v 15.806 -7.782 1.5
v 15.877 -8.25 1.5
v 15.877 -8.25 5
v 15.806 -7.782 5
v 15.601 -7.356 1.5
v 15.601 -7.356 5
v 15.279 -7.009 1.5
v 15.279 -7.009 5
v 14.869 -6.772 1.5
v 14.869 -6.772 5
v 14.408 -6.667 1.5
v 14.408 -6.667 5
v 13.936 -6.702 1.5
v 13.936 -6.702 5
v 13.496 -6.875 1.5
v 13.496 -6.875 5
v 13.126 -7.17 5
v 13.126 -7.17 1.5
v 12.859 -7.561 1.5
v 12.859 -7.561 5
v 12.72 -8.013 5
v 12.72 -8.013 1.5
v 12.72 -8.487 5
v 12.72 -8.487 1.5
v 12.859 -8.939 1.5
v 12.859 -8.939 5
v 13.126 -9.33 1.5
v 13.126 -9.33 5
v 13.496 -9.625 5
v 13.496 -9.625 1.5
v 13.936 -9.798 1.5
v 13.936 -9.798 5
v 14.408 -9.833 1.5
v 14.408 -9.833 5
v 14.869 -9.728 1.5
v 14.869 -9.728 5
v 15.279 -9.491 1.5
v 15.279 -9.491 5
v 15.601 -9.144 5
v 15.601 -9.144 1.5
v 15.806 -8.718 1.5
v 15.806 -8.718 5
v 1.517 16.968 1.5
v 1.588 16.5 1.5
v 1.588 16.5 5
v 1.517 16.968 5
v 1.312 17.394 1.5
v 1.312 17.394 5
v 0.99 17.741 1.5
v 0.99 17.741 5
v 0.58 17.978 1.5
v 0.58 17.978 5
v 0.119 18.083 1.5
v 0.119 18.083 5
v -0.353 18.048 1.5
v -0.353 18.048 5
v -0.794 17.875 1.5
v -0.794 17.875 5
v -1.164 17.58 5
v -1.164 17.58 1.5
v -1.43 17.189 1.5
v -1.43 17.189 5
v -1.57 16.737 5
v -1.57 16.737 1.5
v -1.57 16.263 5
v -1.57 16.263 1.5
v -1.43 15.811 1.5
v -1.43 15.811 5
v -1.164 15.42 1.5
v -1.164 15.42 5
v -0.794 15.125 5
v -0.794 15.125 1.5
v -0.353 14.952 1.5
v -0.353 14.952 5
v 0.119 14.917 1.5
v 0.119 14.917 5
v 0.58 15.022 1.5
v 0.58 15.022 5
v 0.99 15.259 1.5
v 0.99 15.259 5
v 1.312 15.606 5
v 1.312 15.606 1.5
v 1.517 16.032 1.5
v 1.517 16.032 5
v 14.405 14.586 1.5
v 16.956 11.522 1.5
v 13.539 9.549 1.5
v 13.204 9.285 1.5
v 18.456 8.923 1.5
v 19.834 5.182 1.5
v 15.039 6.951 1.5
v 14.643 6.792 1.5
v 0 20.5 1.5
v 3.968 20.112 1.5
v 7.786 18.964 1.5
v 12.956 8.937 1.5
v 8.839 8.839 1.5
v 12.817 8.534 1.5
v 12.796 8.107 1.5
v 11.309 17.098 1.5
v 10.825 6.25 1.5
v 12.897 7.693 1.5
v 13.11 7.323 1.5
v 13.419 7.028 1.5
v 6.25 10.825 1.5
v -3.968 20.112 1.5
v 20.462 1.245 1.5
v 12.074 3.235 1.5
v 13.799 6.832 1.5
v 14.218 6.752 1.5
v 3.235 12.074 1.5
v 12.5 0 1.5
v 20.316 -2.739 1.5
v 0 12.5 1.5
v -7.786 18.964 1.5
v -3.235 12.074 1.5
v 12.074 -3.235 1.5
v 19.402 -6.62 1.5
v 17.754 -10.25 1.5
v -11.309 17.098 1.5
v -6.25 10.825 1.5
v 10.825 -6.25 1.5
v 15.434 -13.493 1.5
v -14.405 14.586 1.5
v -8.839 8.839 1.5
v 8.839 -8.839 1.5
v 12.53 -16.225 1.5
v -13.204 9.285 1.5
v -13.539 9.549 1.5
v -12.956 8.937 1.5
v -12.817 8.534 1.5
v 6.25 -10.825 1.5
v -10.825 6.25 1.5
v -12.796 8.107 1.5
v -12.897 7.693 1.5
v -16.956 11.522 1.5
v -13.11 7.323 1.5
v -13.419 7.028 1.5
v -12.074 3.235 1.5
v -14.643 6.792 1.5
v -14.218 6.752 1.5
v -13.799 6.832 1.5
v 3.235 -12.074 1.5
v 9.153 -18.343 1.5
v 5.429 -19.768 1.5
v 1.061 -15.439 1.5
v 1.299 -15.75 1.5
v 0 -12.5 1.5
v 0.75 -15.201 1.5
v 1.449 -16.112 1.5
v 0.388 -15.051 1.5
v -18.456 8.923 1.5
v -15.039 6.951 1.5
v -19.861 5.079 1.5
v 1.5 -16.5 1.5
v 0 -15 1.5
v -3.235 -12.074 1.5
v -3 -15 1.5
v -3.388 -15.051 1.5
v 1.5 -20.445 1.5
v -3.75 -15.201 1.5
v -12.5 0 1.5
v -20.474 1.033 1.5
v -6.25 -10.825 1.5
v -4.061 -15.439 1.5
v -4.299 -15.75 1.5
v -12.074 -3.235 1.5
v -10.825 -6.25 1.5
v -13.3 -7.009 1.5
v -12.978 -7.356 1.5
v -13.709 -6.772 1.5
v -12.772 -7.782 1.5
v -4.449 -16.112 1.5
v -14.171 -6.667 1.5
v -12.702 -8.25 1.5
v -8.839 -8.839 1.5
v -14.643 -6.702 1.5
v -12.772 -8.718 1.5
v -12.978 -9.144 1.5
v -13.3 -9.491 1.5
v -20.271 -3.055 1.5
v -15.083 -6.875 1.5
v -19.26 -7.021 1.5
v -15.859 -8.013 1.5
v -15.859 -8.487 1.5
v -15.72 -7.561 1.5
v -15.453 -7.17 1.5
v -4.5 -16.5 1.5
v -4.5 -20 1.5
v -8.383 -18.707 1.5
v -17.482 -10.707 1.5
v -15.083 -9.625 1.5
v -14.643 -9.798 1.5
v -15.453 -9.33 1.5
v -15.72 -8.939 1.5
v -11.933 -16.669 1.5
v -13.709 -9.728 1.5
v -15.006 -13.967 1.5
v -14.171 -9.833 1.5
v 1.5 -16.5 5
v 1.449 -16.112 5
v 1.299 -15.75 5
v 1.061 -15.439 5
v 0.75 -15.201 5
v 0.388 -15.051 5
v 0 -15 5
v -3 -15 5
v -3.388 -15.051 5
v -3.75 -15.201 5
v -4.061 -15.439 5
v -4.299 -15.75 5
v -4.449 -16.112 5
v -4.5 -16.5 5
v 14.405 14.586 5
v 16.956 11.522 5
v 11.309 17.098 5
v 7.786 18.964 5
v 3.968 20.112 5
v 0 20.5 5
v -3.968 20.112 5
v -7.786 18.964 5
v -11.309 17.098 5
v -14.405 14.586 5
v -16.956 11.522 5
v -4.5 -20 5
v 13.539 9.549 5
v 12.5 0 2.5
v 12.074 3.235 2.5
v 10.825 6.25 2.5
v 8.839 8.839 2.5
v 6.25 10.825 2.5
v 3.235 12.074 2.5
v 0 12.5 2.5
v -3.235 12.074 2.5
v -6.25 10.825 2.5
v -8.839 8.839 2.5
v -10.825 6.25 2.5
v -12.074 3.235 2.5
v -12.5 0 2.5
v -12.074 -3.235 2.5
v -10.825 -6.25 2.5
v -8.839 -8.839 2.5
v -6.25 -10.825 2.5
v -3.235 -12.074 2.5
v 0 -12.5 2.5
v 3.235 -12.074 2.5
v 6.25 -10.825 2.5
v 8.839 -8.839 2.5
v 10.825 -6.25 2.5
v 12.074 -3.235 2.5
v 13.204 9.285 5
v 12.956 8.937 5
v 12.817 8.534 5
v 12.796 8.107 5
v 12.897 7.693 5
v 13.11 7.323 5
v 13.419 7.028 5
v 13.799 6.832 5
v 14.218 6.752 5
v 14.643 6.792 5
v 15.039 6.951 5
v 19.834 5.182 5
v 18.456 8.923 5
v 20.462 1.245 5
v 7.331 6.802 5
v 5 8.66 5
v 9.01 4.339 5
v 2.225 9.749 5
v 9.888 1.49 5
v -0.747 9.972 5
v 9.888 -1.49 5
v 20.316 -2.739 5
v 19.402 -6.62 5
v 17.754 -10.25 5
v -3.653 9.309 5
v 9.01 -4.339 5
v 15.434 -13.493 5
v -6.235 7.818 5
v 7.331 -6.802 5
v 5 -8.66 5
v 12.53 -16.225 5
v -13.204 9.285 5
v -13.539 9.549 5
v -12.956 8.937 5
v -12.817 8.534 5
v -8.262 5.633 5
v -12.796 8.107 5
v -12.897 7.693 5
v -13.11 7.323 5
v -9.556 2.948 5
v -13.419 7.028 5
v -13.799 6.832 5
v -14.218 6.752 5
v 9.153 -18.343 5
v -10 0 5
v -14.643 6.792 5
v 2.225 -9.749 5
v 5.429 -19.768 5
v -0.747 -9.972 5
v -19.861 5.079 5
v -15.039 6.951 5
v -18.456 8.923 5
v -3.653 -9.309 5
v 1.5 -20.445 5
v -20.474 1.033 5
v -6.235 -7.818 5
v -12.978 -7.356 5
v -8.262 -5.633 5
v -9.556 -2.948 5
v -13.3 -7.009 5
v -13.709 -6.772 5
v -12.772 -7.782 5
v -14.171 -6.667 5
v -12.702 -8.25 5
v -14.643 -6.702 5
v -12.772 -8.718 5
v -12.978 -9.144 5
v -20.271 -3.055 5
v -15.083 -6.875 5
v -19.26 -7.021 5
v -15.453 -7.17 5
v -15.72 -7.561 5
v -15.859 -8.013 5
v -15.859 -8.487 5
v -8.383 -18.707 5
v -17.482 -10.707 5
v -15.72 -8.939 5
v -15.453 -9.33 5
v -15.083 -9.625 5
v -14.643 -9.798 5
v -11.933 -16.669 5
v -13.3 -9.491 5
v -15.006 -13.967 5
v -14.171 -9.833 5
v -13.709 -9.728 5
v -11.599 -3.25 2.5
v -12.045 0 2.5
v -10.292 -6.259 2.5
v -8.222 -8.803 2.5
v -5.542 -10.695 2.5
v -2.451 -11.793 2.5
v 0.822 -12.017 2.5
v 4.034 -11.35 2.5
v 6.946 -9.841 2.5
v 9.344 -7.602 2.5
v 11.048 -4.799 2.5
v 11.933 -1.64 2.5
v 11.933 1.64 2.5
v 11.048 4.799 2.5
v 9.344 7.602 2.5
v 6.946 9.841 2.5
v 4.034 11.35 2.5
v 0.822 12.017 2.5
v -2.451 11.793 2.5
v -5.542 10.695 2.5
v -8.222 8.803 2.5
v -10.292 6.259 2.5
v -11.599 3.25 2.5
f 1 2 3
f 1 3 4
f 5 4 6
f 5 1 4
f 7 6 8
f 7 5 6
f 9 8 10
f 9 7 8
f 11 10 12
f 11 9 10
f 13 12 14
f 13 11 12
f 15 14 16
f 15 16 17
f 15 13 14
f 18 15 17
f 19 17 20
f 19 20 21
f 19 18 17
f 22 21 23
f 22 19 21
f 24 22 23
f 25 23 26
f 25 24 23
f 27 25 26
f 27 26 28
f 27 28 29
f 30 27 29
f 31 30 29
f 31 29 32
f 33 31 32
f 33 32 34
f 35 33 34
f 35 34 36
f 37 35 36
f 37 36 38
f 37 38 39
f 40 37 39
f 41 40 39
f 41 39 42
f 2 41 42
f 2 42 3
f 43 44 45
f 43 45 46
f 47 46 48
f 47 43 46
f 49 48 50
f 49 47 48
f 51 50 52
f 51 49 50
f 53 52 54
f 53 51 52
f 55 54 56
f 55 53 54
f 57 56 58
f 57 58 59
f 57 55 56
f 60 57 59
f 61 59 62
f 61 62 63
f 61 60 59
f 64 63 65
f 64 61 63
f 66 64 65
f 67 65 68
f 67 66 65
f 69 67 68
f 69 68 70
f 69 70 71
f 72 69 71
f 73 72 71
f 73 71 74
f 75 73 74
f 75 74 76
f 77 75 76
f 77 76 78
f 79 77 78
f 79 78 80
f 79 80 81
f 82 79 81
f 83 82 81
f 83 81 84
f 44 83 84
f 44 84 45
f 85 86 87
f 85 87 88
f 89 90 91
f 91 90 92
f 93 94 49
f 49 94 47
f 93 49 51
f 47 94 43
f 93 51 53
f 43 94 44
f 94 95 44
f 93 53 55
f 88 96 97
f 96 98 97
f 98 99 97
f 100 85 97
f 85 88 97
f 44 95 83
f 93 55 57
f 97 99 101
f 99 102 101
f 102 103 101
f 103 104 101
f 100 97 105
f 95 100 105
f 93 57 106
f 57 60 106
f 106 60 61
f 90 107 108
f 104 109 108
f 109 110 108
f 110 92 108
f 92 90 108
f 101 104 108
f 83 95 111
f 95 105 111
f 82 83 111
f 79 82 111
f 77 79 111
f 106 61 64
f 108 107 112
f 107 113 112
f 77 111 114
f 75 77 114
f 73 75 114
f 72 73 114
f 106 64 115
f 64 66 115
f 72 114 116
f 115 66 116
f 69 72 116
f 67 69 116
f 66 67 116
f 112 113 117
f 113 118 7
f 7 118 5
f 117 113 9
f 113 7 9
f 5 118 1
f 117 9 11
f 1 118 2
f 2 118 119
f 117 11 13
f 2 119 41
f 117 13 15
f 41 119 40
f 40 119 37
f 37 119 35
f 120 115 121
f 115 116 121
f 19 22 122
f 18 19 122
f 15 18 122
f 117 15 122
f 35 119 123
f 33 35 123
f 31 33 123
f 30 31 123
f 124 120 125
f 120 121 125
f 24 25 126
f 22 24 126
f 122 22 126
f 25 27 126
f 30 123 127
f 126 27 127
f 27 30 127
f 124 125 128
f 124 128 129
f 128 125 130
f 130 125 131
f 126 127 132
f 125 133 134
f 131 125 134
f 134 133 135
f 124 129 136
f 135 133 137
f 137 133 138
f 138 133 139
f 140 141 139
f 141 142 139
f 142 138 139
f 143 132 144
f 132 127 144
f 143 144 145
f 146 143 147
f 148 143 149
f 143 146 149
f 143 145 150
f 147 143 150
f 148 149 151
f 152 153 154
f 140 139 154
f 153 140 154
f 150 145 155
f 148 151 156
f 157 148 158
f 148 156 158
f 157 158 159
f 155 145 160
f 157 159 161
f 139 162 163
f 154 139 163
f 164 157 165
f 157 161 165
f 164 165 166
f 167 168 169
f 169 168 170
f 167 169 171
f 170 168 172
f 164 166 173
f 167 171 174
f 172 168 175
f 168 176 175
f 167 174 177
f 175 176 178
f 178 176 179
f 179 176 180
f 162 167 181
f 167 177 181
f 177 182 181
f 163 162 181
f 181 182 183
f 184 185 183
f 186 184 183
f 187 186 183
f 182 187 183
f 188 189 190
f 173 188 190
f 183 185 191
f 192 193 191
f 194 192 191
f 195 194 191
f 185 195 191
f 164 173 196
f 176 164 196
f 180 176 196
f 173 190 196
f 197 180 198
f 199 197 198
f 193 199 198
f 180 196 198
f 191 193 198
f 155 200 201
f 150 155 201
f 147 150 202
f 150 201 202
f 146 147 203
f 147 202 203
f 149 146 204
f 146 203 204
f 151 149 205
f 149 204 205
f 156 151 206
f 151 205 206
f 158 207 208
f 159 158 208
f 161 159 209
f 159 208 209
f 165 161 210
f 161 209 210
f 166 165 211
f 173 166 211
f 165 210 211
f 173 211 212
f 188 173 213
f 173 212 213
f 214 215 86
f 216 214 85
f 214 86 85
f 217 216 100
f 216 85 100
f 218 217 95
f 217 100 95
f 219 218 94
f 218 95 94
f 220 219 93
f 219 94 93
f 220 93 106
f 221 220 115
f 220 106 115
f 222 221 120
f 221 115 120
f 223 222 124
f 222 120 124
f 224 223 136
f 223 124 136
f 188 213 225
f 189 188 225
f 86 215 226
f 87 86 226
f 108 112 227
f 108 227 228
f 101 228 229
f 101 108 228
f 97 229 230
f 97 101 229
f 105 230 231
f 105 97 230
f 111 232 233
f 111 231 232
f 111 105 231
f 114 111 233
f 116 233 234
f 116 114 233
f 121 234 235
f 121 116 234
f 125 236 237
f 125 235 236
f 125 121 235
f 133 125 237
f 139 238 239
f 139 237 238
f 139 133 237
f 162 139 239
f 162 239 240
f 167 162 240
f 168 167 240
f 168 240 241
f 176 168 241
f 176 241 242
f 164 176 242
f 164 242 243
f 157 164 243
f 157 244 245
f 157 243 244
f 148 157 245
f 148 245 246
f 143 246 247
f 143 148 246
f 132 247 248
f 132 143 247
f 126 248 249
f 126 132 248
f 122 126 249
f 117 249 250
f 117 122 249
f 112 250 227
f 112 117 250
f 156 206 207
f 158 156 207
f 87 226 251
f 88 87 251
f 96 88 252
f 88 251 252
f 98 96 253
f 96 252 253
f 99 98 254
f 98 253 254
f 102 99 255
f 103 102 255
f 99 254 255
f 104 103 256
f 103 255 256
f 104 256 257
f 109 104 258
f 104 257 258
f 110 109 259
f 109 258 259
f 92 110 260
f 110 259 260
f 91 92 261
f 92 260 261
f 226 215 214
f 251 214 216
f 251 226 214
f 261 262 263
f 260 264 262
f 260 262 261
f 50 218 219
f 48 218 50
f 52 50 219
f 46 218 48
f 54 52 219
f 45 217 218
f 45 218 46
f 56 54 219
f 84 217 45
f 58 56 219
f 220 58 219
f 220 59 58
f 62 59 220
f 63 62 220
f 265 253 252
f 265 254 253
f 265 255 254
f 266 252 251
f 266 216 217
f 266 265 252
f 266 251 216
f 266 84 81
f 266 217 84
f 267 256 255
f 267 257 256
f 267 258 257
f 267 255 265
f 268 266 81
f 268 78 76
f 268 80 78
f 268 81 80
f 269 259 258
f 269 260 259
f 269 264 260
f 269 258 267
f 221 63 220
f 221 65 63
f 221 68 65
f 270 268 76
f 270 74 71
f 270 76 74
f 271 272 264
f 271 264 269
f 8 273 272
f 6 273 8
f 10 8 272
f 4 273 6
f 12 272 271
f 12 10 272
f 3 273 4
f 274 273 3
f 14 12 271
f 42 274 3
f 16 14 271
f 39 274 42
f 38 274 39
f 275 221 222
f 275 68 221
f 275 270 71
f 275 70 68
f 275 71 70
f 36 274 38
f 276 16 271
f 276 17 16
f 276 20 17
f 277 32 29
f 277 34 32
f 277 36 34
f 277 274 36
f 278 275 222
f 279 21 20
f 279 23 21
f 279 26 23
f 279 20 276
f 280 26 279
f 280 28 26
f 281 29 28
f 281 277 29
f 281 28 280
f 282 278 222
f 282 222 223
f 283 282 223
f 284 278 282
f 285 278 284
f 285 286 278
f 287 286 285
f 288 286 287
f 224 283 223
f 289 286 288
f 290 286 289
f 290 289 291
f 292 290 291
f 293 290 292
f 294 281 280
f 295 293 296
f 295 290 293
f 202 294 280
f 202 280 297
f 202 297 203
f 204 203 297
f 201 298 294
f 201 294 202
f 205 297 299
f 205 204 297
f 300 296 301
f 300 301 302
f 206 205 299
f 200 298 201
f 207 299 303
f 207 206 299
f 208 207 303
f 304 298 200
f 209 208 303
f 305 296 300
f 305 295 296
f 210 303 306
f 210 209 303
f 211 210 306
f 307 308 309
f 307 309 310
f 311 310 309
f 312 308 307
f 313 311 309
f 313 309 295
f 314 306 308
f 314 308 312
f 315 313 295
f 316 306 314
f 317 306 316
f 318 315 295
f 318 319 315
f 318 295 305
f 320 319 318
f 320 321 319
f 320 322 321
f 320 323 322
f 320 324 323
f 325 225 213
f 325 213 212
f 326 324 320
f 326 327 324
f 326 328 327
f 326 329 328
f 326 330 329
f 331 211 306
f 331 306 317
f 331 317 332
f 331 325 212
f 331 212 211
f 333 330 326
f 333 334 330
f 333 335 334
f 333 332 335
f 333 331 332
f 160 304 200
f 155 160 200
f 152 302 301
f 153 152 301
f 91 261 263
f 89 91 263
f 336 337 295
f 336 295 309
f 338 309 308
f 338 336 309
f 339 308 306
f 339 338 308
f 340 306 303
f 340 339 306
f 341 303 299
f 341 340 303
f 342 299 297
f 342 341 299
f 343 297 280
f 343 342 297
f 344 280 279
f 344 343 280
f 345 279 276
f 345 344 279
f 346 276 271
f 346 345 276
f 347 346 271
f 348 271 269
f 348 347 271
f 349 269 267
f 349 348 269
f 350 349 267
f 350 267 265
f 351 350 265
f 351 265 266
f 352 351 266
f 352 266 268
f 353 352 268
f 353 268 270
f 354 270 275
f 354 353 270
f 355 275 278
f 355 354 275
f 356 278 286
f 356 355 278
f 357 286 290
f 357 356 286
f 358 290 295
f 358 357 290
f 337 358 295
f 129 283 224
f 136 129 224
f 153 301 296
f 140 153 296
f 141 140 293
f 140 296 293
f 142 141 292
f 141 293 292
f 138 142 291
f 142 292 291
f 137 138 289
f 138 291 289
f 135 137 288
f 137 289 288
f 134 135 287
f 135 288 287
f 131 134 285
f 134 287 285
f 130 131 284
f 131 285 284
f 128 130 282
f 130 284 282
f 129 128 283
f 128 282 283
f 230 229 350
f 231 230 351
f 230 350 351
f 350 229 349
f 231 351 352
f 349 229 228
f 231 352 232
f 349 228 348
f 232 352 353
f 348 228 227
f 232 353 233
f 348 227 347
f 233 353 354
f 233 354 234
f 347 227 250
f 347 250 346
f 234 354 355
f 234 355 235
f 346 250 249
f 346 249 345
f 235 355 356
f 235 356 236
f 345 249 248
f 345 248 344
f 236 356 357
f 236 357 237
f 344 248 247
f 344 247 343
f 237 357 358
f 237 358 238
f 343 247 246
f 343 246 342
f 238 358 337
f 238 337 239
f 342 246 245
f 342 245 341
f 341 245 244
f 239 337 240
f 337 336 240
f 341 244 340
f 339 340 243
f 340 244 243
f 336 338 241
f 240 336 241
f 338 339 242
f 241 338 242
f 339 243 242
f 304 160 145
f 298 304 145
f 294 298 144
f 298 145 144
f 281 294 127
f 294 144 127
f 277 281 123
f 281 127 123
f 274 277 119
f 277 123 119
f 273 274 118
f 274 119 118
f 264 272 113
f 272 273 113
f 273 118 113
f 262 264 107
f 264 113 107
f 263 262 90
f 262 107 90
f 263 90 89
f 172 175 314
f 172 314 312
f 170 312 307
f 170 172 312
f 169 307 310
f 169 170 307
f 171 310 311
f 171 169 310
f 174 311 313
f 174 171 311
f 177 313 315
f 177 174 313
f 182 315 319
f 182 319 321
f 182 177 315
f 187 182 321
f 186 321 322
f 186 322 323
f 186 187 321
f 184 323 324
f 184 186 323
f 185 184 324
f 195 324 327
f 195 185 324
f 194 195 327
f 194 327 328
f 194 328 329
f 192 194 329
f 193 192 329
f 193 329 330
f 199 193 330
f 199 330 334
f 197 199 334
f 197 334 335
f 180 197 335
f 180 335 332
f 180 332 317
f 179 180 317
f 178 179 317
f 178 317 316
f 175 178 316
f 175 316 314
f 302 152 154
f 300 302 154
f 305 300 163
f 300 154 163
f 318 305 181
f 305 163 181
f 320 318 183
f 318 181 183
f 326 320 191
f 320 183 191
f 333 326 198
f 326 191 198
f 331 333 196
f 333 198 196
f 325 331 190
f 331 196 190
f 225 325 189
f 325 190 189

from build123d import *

# Parameters (mm, degrees)
SKETCH1_R          = 20.5
SKETCH1_R_2        = 12.5
SKETCH1_R_3        = 1.5875
EXTRUDE1_DEPTH     = 5
CUT_EXTRUDE1_DEPTH = 30.419381367
CIRPATTERN1_COUNT  = 3
SKETCH3_W          = 2.5
SKETCH3_H          = 2.5
SKETCH4_W          = 20.5
SKETCH4_H          = 1.5
CUT_EXTRUDE2_DEPTH = 30.201883501


with BuildPart() as part:
    # Sketch1 → Extrude1 (new body)
    with BuildSketch(Plane.XY):
        Circle(SKETCH1_R)
        Circle(SKETCH1_R_2, mode=Mode.SUBTRACT)
        with Locations((0, 16.5)):
            Circle(SKETCH1_R_3, mode=Mode.SUBTRACT)
        with Locations((14.289419162, -8.25)):
            Circle(SKETCH1_R_3, mode=Mode.SUBTRACT)
        with Locations((-14.289419162, -8.25)):
            Circle(SKETCH1_R_3, mode=Mode.SUBTRACT)
    extrude(amount=EXTRUDE1_DEPTH)

    # Sketch2 → Cut-Extrude1 (cut, through all)
    with BuildSketch(Plane.XY.offset(5)):
        with BuildLine():
            ThreePointArc((1.5, -16.5), (0, -15), (-1.5, -16.5))
            Line((-1.5, -16.5), (-1.5, -20.4450483))
            ThreePointArc((-1.5, -20.4450483), (0, -20.5), (1.5, -20.4450483))
            Line((1.5, -20.4450483), (1.5, -16.5))
        make_face()
    cut_extrude1 = extrude(amount=-CUT_EXTRUDE1_DEPTH, mode=Mode.SUBTRACT)

    # CirPattern1: Cut-Extrude1 ×3 about axis
    cirpattern1_axis = Axis((0, 0, 5), (0, 0, -1))
    for i in range(1, CIRPATTERN1_COUNT):
        add(cut_extrude1.rotate(cirpattern1_axis, i * 360 / CIRPATTERN1_COUNT), mode=Mode.SUBTRACT)

    # Sketch3 → Revolve1 (revolve)
    with BuildSketch(Plane(origin=(0, 0, 0), x_dir=(1, 0, 0), z_dir=(0, 1, 0))):
        with Locations((-11.25, -3.75)):
            Rectangle(SKETCH3_W, SKETCH3_H)
    revolve(axis=Axis((0, 0, 0), (0, 0, 1)))

    # Sketch4 → Cut-Revolve1 (revolve, cut)
    with BuildSketch(Plane(origin=(0, 0, 0), x_dir=(1, 0, 0), z_dir=(0, 1, 0))):
        with Locations((-10.25, -0.75)):
            Rectangle(SKETCH4_W, SKETCH4_H)
    revolve(axis=Axis((0, 0, 0), (0, 0, 1)), mode=Mode.SUBTRACT)

    # Sketch5 → Cut-Extrude2 (cut, through all)
    with BuildSketch(Plane.XY.offset(5)):
        with BuildLine():
            ThreePointArc((-1.5, -16.5), (-1.060660172, -15.439339828), (0, -15))
            Line((0, -15), (-3, -15))
            ThreePointArc((-3, -15), (-4.060660172, -15.439339828), (-4.5, -16.5))
            Line((-4.5, -16.5), (-4.5, -20))
            ThreePointArc((-4.5, -20), (-3.008241512, -20.278078878), (-1.5, -20.4450483))
            Line((-1.5, -20.4450483), (-1.5, -16.5))
        make_face()
    extrude(amount=-CUT_EXTRUDE2_DEPTH, mode=Mode.SUBTRACT)

    # Sketch6 → Cut-Revolve2 (revolve, cut)
    with BuildSketch(Plane(origin=(0, 0, 0), x_dir=(1, 0, 0), z_dir=(0, 1, 0))):
        Polygon((-10, -5), (-12.045348365, -2.5), (-10, -2.5), align=None)
    revolve(axis=Axis((0, 0, 0), (0, 0, 1)), mode=Mode.SUBTRACT)


solid = part.part
